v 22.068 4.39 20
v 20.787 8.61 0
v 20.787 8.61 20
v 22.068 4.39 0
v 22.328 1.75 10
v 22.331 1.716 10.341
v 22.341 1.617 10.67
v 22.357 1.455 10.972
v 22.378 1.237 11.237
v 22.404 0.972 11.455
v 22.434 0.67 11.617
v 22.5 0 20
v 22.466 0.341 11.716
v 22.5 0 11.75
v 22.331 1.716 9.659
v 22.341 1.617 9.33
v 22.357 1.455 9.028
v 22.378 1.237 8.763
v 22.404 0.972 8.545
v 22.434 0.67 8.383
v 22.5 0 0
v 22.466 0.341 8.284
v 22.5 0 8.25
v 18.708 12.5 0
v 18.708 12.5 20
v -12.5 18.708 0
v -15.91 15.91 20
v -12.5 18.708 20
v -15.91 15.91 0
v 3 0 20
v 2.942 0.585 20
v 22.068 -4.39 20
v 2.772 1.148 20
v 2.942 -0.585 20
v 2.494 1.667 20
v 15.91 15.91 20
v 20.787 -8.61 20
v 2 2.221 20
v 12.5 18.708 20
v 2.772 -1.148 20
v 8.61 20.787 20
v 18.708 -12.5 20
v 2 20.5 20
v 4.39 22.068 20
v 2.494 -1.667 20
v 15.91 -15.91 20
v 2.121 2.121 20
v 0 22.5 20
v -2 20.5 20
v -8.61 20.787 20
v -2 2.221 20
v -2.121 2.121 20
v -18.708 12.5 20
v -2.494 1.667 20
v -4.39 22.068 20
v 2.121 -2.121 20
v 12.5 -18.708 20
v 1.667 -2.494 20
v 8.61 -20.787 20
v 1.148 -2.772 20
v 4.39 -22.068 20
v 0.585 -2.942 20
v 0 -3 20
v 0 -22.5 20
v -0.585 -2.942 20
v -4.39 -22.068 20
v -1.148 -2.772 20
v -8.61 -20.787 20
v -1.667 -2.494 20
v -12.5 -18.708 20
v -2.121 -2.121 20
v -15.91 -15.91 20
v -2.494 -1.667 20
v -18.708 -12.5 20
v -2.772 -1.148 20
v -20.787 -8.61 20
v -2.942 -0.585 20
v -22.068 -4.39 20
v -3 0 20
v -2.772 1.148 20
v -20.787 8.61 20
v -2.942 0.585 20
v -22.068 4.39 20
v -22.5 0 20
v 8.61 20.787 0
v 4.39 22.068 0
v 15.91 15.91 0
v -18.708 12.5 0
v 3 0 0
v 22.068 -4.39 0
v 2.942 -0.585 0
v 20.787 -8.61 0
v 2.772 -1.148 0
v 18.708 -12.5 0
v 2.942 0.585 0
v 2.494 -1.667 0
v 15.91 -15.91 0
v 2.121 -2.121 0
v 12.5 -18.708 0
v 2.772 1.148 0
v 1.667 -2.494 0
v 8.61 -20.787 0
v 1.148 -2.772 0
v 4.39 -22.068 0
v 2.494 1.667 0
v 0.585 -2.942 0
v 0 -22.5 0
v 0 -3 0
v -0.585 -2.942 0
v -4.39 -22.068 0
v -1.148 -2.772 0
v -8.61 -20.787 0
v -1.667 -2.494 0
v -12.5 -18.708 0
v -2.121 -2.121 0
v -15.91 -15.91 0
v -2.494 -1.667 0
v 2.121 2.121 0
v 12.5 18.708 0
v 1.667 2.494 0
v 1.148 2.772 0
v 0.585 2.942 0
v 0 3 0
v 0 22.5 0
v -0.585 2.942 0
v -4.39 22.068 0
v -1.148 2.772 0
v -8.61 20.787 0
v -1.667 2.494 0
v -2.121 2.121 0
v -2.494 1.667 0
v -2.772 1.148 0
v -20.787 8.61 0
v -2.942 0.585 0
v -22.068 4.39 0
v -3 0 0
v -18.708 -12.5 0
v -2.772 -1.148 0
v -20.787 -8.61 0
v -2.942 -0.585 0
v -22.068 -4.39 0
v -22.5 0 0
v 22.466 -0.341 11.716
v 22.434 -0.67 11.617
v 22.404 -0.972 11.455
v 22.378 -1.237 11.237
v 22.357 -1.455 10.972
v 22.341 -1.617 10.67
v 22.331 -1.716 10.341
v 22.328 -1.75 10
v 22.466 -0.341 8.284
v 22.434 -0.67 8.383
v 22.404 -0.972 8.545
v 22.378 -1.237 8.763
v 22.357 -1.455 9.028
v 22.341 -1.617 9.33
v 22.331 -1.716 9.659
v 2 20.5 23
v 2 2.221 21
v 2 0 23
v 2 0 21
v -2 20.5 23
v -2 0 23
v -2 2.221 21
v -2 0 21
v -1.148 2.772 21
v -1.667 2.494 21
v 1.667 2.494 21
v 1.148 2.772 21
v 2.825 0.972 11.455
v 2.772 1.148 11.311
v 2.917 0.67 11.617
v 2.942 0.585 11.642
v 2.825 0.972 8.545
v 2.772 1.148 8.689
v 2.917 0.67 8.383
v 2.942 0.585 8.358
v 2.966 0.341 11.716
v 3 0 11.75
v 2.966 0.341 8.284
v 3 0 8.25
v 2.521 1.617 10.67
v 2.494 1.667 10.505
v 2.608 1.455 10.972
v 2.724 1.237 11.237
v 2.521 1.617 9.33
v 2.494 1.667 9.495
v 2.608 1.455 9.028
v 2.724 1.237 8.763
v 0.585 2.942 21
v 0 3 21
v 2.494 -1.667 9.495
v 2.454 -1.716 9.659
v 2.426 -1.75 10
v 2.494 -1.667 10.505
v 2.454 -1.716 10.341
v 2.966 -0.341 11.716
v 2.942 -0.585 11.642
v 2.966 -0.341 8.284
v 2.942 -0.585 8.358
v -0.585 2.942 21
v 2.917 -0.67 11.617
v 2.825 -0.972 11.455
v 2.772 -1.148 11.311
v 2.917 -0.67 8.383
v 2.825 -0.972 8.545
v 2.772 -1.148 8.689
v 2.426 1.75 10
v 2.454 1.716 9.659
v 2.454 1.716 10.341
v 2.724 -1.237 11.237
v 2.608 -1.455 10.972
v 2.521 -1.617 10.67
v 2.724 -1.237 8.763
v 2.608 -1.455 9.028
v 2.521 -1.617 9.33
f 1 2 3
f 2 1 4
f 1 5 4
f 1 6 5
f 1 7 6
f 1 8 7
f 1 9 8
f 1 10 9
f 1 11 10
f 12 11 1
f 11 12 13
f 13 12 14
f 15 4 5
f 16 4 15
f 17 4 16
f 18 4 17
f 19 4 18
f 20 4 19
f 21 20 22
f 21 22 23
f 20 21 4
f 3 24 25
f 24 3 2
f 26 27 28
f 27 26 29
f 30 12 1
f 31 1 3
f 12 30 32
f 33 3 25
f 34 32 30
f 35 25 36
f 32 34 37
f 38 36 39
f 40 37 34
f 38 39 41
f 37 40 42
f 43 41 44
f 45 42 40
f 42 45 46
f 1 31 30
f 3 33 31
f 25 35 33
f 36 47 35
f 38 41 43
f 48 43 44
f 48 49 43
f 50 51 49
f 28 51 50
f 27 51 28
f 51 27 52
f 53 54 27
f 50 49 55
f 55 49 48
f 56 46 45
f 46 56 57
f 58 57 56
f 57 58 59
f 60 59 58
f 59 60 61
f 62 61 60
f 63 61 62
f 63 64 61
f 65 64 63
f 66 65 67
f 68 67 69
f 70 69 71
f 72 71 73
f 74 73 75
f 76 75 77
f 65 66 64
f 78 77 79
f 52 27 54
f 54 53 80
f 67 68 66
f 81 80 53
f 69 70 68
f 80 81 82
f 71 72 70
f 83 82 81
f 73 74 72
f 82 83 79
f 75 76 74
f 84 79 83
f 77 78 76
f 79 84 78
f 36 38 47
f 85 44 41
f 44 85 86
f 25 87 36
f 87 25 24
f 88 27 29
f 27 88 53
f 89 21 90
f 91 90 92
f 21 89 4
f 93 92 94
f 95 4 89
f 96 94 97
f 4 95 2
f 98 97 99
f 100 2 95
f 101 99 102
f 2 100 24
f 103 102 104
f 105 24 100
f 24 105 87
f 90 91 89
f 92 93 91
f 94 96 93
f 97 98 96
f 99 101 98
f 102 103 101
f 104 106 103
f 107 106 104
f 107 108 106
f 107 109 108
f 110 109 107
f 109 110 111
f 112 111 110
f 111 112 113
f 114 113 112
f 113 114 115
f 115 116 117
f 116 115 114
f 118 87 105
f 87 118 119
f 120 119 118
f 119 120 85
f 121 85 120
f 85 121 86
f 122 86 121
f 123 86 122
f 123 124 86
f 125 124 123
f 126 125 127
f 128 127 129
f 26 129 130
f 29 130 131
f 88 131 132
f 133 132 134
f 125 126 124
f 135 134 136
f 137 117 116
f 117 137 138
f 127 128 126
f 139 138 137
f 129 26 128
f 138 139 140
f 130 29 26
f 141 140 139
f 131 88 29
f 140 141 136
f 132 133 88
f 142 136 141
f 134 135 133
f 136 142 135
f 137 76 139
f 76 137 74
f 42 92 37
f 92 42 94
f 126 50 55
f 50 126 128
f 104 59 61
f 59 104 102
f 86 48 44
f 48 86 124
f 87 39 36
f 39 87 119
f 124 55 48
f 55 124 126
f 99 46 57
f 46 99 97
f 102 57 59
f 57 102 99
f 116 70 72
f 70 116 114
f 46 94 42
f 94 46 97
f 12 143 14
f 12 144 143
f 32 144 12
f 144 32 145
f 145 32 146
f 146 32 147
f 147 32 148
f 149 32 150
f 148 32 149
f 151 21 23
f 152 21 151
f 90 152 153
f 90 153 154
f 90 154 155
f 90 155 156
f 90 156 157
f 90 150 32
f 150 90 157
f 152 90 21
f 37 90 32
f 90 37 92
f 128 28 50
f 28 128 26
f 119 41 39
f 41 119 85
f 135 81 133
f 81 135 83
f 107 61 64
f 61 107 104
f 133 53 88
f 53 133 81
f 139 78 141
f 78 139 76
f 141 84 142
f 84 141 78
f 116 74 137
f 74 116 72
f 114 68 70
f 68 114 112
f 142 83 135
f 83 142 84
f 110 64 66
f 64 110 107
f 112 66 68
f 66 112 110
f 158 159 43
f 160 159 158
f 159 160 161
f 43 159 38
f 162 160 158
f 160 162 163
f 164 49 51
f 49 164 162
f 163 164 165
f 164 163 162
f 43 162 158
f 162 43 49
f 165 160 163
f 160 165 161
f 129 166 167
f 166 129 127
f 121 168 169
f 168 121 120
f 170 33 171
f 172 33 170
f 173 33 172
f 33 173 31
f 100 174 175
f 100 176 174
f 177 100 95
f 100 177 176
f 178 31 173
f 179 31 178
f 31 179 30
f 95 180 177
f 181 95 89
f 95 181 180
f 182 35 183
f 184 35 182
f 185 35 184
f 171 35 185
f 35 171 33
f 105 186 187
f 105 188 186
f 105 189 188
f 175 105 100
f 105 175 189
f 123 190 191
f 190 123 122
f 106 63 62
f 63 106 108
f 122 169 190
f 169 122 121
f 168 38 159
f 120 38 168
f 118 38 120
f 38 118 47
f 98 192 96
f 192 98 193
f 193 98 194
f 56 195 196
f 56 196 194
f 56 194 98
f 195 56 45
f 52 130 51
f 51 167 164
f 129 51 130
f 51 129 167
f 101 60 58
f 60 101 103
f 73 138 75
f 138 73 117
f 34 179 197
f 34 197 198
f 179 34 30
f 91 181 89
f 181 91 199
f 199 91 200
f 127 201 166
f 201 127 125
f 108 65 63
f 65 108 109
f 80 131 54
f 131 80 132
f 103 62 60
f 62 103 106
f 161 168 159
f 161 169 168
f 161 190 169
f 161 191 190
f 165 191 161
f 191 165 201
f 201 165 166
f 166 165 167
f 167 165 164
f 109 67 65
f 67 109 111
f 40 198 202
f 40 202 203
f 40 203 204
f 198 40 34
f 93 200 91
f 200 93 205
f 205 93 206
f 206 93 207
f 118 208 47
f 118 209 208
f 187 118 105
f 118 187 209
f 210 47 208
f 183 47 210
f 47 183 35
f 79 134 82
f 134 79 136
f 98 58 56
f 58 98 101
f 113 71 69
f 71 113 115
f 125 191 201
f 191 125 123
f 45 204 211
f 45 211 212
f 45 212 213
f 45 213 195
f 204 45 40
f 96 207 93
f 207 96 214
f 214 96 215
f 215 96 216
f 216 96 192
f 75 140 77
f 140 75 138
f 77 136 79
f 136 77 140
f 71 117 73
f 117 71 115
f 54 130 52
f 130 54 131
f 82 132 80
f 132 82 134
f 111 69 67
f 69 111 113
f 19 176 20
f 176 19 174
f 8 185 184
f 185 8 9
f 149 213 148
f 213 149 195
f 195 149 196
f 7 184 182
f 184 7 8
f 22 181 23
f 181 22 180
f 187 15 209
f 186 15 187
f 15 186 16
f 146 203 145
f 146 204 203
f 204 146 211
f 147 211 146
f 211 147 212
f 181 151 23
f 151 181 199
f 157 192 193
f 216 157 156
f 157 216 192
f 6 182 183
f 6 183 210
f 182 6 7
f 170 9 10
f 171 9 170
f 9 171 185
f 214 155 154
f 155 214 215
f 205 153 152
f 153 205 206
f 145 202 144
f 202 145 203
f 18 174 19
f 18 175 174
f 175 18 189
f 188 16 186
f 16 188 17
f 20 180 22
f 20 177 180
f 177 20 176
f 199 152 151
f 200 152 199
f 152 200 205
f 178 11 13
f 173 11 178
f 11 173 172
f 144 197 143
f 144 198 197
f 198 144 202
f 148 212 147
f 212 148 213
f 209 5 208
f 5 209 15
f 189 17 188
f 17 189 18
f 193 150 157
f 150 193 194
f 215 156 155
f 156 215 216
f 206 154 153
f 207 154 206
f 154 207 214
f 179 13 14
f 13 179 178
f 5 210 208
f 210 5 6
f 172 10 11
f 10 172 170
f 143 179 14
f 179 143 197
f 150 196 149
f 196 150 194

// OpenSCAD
$fn = 32;

// ----------------------------------------------------------------------
// Control knob: pointer knob
// ----------------------------------------------------------------------

// --- parameters (mm) ---
rib_w = 4;                // pointer rib width
rib_h = 4;                // pointer rib height
knob_d = 45;              // knob body diameter
knob_h = 20;              // knob body height
bore_d = 6;               // shaft bore diameter
set_d = 3.5;              // set screw bore diameter

rib_poke = rib_h - 1;  // rib height above the top
total_h = knob_h + rib_h - 1;  // overall height

difference() {
  union() {
    cylinder(h = knob_h, d = knob_d);
    translate([-rib_w / 2, 0, knob_h - 1])
      cube([rib_w, knob_d / 2 - 2, rib_h]);
  }
  translate([0, 0, -1]) cylinder(h = knob_h + 2, d = bore_d);
  translate([-1, 0, knob_h / 2]) rotate([0, 90, 0])
    cylinder(h = knob_d / 2 + bore_d / 2 + 2, d = set_d);}
